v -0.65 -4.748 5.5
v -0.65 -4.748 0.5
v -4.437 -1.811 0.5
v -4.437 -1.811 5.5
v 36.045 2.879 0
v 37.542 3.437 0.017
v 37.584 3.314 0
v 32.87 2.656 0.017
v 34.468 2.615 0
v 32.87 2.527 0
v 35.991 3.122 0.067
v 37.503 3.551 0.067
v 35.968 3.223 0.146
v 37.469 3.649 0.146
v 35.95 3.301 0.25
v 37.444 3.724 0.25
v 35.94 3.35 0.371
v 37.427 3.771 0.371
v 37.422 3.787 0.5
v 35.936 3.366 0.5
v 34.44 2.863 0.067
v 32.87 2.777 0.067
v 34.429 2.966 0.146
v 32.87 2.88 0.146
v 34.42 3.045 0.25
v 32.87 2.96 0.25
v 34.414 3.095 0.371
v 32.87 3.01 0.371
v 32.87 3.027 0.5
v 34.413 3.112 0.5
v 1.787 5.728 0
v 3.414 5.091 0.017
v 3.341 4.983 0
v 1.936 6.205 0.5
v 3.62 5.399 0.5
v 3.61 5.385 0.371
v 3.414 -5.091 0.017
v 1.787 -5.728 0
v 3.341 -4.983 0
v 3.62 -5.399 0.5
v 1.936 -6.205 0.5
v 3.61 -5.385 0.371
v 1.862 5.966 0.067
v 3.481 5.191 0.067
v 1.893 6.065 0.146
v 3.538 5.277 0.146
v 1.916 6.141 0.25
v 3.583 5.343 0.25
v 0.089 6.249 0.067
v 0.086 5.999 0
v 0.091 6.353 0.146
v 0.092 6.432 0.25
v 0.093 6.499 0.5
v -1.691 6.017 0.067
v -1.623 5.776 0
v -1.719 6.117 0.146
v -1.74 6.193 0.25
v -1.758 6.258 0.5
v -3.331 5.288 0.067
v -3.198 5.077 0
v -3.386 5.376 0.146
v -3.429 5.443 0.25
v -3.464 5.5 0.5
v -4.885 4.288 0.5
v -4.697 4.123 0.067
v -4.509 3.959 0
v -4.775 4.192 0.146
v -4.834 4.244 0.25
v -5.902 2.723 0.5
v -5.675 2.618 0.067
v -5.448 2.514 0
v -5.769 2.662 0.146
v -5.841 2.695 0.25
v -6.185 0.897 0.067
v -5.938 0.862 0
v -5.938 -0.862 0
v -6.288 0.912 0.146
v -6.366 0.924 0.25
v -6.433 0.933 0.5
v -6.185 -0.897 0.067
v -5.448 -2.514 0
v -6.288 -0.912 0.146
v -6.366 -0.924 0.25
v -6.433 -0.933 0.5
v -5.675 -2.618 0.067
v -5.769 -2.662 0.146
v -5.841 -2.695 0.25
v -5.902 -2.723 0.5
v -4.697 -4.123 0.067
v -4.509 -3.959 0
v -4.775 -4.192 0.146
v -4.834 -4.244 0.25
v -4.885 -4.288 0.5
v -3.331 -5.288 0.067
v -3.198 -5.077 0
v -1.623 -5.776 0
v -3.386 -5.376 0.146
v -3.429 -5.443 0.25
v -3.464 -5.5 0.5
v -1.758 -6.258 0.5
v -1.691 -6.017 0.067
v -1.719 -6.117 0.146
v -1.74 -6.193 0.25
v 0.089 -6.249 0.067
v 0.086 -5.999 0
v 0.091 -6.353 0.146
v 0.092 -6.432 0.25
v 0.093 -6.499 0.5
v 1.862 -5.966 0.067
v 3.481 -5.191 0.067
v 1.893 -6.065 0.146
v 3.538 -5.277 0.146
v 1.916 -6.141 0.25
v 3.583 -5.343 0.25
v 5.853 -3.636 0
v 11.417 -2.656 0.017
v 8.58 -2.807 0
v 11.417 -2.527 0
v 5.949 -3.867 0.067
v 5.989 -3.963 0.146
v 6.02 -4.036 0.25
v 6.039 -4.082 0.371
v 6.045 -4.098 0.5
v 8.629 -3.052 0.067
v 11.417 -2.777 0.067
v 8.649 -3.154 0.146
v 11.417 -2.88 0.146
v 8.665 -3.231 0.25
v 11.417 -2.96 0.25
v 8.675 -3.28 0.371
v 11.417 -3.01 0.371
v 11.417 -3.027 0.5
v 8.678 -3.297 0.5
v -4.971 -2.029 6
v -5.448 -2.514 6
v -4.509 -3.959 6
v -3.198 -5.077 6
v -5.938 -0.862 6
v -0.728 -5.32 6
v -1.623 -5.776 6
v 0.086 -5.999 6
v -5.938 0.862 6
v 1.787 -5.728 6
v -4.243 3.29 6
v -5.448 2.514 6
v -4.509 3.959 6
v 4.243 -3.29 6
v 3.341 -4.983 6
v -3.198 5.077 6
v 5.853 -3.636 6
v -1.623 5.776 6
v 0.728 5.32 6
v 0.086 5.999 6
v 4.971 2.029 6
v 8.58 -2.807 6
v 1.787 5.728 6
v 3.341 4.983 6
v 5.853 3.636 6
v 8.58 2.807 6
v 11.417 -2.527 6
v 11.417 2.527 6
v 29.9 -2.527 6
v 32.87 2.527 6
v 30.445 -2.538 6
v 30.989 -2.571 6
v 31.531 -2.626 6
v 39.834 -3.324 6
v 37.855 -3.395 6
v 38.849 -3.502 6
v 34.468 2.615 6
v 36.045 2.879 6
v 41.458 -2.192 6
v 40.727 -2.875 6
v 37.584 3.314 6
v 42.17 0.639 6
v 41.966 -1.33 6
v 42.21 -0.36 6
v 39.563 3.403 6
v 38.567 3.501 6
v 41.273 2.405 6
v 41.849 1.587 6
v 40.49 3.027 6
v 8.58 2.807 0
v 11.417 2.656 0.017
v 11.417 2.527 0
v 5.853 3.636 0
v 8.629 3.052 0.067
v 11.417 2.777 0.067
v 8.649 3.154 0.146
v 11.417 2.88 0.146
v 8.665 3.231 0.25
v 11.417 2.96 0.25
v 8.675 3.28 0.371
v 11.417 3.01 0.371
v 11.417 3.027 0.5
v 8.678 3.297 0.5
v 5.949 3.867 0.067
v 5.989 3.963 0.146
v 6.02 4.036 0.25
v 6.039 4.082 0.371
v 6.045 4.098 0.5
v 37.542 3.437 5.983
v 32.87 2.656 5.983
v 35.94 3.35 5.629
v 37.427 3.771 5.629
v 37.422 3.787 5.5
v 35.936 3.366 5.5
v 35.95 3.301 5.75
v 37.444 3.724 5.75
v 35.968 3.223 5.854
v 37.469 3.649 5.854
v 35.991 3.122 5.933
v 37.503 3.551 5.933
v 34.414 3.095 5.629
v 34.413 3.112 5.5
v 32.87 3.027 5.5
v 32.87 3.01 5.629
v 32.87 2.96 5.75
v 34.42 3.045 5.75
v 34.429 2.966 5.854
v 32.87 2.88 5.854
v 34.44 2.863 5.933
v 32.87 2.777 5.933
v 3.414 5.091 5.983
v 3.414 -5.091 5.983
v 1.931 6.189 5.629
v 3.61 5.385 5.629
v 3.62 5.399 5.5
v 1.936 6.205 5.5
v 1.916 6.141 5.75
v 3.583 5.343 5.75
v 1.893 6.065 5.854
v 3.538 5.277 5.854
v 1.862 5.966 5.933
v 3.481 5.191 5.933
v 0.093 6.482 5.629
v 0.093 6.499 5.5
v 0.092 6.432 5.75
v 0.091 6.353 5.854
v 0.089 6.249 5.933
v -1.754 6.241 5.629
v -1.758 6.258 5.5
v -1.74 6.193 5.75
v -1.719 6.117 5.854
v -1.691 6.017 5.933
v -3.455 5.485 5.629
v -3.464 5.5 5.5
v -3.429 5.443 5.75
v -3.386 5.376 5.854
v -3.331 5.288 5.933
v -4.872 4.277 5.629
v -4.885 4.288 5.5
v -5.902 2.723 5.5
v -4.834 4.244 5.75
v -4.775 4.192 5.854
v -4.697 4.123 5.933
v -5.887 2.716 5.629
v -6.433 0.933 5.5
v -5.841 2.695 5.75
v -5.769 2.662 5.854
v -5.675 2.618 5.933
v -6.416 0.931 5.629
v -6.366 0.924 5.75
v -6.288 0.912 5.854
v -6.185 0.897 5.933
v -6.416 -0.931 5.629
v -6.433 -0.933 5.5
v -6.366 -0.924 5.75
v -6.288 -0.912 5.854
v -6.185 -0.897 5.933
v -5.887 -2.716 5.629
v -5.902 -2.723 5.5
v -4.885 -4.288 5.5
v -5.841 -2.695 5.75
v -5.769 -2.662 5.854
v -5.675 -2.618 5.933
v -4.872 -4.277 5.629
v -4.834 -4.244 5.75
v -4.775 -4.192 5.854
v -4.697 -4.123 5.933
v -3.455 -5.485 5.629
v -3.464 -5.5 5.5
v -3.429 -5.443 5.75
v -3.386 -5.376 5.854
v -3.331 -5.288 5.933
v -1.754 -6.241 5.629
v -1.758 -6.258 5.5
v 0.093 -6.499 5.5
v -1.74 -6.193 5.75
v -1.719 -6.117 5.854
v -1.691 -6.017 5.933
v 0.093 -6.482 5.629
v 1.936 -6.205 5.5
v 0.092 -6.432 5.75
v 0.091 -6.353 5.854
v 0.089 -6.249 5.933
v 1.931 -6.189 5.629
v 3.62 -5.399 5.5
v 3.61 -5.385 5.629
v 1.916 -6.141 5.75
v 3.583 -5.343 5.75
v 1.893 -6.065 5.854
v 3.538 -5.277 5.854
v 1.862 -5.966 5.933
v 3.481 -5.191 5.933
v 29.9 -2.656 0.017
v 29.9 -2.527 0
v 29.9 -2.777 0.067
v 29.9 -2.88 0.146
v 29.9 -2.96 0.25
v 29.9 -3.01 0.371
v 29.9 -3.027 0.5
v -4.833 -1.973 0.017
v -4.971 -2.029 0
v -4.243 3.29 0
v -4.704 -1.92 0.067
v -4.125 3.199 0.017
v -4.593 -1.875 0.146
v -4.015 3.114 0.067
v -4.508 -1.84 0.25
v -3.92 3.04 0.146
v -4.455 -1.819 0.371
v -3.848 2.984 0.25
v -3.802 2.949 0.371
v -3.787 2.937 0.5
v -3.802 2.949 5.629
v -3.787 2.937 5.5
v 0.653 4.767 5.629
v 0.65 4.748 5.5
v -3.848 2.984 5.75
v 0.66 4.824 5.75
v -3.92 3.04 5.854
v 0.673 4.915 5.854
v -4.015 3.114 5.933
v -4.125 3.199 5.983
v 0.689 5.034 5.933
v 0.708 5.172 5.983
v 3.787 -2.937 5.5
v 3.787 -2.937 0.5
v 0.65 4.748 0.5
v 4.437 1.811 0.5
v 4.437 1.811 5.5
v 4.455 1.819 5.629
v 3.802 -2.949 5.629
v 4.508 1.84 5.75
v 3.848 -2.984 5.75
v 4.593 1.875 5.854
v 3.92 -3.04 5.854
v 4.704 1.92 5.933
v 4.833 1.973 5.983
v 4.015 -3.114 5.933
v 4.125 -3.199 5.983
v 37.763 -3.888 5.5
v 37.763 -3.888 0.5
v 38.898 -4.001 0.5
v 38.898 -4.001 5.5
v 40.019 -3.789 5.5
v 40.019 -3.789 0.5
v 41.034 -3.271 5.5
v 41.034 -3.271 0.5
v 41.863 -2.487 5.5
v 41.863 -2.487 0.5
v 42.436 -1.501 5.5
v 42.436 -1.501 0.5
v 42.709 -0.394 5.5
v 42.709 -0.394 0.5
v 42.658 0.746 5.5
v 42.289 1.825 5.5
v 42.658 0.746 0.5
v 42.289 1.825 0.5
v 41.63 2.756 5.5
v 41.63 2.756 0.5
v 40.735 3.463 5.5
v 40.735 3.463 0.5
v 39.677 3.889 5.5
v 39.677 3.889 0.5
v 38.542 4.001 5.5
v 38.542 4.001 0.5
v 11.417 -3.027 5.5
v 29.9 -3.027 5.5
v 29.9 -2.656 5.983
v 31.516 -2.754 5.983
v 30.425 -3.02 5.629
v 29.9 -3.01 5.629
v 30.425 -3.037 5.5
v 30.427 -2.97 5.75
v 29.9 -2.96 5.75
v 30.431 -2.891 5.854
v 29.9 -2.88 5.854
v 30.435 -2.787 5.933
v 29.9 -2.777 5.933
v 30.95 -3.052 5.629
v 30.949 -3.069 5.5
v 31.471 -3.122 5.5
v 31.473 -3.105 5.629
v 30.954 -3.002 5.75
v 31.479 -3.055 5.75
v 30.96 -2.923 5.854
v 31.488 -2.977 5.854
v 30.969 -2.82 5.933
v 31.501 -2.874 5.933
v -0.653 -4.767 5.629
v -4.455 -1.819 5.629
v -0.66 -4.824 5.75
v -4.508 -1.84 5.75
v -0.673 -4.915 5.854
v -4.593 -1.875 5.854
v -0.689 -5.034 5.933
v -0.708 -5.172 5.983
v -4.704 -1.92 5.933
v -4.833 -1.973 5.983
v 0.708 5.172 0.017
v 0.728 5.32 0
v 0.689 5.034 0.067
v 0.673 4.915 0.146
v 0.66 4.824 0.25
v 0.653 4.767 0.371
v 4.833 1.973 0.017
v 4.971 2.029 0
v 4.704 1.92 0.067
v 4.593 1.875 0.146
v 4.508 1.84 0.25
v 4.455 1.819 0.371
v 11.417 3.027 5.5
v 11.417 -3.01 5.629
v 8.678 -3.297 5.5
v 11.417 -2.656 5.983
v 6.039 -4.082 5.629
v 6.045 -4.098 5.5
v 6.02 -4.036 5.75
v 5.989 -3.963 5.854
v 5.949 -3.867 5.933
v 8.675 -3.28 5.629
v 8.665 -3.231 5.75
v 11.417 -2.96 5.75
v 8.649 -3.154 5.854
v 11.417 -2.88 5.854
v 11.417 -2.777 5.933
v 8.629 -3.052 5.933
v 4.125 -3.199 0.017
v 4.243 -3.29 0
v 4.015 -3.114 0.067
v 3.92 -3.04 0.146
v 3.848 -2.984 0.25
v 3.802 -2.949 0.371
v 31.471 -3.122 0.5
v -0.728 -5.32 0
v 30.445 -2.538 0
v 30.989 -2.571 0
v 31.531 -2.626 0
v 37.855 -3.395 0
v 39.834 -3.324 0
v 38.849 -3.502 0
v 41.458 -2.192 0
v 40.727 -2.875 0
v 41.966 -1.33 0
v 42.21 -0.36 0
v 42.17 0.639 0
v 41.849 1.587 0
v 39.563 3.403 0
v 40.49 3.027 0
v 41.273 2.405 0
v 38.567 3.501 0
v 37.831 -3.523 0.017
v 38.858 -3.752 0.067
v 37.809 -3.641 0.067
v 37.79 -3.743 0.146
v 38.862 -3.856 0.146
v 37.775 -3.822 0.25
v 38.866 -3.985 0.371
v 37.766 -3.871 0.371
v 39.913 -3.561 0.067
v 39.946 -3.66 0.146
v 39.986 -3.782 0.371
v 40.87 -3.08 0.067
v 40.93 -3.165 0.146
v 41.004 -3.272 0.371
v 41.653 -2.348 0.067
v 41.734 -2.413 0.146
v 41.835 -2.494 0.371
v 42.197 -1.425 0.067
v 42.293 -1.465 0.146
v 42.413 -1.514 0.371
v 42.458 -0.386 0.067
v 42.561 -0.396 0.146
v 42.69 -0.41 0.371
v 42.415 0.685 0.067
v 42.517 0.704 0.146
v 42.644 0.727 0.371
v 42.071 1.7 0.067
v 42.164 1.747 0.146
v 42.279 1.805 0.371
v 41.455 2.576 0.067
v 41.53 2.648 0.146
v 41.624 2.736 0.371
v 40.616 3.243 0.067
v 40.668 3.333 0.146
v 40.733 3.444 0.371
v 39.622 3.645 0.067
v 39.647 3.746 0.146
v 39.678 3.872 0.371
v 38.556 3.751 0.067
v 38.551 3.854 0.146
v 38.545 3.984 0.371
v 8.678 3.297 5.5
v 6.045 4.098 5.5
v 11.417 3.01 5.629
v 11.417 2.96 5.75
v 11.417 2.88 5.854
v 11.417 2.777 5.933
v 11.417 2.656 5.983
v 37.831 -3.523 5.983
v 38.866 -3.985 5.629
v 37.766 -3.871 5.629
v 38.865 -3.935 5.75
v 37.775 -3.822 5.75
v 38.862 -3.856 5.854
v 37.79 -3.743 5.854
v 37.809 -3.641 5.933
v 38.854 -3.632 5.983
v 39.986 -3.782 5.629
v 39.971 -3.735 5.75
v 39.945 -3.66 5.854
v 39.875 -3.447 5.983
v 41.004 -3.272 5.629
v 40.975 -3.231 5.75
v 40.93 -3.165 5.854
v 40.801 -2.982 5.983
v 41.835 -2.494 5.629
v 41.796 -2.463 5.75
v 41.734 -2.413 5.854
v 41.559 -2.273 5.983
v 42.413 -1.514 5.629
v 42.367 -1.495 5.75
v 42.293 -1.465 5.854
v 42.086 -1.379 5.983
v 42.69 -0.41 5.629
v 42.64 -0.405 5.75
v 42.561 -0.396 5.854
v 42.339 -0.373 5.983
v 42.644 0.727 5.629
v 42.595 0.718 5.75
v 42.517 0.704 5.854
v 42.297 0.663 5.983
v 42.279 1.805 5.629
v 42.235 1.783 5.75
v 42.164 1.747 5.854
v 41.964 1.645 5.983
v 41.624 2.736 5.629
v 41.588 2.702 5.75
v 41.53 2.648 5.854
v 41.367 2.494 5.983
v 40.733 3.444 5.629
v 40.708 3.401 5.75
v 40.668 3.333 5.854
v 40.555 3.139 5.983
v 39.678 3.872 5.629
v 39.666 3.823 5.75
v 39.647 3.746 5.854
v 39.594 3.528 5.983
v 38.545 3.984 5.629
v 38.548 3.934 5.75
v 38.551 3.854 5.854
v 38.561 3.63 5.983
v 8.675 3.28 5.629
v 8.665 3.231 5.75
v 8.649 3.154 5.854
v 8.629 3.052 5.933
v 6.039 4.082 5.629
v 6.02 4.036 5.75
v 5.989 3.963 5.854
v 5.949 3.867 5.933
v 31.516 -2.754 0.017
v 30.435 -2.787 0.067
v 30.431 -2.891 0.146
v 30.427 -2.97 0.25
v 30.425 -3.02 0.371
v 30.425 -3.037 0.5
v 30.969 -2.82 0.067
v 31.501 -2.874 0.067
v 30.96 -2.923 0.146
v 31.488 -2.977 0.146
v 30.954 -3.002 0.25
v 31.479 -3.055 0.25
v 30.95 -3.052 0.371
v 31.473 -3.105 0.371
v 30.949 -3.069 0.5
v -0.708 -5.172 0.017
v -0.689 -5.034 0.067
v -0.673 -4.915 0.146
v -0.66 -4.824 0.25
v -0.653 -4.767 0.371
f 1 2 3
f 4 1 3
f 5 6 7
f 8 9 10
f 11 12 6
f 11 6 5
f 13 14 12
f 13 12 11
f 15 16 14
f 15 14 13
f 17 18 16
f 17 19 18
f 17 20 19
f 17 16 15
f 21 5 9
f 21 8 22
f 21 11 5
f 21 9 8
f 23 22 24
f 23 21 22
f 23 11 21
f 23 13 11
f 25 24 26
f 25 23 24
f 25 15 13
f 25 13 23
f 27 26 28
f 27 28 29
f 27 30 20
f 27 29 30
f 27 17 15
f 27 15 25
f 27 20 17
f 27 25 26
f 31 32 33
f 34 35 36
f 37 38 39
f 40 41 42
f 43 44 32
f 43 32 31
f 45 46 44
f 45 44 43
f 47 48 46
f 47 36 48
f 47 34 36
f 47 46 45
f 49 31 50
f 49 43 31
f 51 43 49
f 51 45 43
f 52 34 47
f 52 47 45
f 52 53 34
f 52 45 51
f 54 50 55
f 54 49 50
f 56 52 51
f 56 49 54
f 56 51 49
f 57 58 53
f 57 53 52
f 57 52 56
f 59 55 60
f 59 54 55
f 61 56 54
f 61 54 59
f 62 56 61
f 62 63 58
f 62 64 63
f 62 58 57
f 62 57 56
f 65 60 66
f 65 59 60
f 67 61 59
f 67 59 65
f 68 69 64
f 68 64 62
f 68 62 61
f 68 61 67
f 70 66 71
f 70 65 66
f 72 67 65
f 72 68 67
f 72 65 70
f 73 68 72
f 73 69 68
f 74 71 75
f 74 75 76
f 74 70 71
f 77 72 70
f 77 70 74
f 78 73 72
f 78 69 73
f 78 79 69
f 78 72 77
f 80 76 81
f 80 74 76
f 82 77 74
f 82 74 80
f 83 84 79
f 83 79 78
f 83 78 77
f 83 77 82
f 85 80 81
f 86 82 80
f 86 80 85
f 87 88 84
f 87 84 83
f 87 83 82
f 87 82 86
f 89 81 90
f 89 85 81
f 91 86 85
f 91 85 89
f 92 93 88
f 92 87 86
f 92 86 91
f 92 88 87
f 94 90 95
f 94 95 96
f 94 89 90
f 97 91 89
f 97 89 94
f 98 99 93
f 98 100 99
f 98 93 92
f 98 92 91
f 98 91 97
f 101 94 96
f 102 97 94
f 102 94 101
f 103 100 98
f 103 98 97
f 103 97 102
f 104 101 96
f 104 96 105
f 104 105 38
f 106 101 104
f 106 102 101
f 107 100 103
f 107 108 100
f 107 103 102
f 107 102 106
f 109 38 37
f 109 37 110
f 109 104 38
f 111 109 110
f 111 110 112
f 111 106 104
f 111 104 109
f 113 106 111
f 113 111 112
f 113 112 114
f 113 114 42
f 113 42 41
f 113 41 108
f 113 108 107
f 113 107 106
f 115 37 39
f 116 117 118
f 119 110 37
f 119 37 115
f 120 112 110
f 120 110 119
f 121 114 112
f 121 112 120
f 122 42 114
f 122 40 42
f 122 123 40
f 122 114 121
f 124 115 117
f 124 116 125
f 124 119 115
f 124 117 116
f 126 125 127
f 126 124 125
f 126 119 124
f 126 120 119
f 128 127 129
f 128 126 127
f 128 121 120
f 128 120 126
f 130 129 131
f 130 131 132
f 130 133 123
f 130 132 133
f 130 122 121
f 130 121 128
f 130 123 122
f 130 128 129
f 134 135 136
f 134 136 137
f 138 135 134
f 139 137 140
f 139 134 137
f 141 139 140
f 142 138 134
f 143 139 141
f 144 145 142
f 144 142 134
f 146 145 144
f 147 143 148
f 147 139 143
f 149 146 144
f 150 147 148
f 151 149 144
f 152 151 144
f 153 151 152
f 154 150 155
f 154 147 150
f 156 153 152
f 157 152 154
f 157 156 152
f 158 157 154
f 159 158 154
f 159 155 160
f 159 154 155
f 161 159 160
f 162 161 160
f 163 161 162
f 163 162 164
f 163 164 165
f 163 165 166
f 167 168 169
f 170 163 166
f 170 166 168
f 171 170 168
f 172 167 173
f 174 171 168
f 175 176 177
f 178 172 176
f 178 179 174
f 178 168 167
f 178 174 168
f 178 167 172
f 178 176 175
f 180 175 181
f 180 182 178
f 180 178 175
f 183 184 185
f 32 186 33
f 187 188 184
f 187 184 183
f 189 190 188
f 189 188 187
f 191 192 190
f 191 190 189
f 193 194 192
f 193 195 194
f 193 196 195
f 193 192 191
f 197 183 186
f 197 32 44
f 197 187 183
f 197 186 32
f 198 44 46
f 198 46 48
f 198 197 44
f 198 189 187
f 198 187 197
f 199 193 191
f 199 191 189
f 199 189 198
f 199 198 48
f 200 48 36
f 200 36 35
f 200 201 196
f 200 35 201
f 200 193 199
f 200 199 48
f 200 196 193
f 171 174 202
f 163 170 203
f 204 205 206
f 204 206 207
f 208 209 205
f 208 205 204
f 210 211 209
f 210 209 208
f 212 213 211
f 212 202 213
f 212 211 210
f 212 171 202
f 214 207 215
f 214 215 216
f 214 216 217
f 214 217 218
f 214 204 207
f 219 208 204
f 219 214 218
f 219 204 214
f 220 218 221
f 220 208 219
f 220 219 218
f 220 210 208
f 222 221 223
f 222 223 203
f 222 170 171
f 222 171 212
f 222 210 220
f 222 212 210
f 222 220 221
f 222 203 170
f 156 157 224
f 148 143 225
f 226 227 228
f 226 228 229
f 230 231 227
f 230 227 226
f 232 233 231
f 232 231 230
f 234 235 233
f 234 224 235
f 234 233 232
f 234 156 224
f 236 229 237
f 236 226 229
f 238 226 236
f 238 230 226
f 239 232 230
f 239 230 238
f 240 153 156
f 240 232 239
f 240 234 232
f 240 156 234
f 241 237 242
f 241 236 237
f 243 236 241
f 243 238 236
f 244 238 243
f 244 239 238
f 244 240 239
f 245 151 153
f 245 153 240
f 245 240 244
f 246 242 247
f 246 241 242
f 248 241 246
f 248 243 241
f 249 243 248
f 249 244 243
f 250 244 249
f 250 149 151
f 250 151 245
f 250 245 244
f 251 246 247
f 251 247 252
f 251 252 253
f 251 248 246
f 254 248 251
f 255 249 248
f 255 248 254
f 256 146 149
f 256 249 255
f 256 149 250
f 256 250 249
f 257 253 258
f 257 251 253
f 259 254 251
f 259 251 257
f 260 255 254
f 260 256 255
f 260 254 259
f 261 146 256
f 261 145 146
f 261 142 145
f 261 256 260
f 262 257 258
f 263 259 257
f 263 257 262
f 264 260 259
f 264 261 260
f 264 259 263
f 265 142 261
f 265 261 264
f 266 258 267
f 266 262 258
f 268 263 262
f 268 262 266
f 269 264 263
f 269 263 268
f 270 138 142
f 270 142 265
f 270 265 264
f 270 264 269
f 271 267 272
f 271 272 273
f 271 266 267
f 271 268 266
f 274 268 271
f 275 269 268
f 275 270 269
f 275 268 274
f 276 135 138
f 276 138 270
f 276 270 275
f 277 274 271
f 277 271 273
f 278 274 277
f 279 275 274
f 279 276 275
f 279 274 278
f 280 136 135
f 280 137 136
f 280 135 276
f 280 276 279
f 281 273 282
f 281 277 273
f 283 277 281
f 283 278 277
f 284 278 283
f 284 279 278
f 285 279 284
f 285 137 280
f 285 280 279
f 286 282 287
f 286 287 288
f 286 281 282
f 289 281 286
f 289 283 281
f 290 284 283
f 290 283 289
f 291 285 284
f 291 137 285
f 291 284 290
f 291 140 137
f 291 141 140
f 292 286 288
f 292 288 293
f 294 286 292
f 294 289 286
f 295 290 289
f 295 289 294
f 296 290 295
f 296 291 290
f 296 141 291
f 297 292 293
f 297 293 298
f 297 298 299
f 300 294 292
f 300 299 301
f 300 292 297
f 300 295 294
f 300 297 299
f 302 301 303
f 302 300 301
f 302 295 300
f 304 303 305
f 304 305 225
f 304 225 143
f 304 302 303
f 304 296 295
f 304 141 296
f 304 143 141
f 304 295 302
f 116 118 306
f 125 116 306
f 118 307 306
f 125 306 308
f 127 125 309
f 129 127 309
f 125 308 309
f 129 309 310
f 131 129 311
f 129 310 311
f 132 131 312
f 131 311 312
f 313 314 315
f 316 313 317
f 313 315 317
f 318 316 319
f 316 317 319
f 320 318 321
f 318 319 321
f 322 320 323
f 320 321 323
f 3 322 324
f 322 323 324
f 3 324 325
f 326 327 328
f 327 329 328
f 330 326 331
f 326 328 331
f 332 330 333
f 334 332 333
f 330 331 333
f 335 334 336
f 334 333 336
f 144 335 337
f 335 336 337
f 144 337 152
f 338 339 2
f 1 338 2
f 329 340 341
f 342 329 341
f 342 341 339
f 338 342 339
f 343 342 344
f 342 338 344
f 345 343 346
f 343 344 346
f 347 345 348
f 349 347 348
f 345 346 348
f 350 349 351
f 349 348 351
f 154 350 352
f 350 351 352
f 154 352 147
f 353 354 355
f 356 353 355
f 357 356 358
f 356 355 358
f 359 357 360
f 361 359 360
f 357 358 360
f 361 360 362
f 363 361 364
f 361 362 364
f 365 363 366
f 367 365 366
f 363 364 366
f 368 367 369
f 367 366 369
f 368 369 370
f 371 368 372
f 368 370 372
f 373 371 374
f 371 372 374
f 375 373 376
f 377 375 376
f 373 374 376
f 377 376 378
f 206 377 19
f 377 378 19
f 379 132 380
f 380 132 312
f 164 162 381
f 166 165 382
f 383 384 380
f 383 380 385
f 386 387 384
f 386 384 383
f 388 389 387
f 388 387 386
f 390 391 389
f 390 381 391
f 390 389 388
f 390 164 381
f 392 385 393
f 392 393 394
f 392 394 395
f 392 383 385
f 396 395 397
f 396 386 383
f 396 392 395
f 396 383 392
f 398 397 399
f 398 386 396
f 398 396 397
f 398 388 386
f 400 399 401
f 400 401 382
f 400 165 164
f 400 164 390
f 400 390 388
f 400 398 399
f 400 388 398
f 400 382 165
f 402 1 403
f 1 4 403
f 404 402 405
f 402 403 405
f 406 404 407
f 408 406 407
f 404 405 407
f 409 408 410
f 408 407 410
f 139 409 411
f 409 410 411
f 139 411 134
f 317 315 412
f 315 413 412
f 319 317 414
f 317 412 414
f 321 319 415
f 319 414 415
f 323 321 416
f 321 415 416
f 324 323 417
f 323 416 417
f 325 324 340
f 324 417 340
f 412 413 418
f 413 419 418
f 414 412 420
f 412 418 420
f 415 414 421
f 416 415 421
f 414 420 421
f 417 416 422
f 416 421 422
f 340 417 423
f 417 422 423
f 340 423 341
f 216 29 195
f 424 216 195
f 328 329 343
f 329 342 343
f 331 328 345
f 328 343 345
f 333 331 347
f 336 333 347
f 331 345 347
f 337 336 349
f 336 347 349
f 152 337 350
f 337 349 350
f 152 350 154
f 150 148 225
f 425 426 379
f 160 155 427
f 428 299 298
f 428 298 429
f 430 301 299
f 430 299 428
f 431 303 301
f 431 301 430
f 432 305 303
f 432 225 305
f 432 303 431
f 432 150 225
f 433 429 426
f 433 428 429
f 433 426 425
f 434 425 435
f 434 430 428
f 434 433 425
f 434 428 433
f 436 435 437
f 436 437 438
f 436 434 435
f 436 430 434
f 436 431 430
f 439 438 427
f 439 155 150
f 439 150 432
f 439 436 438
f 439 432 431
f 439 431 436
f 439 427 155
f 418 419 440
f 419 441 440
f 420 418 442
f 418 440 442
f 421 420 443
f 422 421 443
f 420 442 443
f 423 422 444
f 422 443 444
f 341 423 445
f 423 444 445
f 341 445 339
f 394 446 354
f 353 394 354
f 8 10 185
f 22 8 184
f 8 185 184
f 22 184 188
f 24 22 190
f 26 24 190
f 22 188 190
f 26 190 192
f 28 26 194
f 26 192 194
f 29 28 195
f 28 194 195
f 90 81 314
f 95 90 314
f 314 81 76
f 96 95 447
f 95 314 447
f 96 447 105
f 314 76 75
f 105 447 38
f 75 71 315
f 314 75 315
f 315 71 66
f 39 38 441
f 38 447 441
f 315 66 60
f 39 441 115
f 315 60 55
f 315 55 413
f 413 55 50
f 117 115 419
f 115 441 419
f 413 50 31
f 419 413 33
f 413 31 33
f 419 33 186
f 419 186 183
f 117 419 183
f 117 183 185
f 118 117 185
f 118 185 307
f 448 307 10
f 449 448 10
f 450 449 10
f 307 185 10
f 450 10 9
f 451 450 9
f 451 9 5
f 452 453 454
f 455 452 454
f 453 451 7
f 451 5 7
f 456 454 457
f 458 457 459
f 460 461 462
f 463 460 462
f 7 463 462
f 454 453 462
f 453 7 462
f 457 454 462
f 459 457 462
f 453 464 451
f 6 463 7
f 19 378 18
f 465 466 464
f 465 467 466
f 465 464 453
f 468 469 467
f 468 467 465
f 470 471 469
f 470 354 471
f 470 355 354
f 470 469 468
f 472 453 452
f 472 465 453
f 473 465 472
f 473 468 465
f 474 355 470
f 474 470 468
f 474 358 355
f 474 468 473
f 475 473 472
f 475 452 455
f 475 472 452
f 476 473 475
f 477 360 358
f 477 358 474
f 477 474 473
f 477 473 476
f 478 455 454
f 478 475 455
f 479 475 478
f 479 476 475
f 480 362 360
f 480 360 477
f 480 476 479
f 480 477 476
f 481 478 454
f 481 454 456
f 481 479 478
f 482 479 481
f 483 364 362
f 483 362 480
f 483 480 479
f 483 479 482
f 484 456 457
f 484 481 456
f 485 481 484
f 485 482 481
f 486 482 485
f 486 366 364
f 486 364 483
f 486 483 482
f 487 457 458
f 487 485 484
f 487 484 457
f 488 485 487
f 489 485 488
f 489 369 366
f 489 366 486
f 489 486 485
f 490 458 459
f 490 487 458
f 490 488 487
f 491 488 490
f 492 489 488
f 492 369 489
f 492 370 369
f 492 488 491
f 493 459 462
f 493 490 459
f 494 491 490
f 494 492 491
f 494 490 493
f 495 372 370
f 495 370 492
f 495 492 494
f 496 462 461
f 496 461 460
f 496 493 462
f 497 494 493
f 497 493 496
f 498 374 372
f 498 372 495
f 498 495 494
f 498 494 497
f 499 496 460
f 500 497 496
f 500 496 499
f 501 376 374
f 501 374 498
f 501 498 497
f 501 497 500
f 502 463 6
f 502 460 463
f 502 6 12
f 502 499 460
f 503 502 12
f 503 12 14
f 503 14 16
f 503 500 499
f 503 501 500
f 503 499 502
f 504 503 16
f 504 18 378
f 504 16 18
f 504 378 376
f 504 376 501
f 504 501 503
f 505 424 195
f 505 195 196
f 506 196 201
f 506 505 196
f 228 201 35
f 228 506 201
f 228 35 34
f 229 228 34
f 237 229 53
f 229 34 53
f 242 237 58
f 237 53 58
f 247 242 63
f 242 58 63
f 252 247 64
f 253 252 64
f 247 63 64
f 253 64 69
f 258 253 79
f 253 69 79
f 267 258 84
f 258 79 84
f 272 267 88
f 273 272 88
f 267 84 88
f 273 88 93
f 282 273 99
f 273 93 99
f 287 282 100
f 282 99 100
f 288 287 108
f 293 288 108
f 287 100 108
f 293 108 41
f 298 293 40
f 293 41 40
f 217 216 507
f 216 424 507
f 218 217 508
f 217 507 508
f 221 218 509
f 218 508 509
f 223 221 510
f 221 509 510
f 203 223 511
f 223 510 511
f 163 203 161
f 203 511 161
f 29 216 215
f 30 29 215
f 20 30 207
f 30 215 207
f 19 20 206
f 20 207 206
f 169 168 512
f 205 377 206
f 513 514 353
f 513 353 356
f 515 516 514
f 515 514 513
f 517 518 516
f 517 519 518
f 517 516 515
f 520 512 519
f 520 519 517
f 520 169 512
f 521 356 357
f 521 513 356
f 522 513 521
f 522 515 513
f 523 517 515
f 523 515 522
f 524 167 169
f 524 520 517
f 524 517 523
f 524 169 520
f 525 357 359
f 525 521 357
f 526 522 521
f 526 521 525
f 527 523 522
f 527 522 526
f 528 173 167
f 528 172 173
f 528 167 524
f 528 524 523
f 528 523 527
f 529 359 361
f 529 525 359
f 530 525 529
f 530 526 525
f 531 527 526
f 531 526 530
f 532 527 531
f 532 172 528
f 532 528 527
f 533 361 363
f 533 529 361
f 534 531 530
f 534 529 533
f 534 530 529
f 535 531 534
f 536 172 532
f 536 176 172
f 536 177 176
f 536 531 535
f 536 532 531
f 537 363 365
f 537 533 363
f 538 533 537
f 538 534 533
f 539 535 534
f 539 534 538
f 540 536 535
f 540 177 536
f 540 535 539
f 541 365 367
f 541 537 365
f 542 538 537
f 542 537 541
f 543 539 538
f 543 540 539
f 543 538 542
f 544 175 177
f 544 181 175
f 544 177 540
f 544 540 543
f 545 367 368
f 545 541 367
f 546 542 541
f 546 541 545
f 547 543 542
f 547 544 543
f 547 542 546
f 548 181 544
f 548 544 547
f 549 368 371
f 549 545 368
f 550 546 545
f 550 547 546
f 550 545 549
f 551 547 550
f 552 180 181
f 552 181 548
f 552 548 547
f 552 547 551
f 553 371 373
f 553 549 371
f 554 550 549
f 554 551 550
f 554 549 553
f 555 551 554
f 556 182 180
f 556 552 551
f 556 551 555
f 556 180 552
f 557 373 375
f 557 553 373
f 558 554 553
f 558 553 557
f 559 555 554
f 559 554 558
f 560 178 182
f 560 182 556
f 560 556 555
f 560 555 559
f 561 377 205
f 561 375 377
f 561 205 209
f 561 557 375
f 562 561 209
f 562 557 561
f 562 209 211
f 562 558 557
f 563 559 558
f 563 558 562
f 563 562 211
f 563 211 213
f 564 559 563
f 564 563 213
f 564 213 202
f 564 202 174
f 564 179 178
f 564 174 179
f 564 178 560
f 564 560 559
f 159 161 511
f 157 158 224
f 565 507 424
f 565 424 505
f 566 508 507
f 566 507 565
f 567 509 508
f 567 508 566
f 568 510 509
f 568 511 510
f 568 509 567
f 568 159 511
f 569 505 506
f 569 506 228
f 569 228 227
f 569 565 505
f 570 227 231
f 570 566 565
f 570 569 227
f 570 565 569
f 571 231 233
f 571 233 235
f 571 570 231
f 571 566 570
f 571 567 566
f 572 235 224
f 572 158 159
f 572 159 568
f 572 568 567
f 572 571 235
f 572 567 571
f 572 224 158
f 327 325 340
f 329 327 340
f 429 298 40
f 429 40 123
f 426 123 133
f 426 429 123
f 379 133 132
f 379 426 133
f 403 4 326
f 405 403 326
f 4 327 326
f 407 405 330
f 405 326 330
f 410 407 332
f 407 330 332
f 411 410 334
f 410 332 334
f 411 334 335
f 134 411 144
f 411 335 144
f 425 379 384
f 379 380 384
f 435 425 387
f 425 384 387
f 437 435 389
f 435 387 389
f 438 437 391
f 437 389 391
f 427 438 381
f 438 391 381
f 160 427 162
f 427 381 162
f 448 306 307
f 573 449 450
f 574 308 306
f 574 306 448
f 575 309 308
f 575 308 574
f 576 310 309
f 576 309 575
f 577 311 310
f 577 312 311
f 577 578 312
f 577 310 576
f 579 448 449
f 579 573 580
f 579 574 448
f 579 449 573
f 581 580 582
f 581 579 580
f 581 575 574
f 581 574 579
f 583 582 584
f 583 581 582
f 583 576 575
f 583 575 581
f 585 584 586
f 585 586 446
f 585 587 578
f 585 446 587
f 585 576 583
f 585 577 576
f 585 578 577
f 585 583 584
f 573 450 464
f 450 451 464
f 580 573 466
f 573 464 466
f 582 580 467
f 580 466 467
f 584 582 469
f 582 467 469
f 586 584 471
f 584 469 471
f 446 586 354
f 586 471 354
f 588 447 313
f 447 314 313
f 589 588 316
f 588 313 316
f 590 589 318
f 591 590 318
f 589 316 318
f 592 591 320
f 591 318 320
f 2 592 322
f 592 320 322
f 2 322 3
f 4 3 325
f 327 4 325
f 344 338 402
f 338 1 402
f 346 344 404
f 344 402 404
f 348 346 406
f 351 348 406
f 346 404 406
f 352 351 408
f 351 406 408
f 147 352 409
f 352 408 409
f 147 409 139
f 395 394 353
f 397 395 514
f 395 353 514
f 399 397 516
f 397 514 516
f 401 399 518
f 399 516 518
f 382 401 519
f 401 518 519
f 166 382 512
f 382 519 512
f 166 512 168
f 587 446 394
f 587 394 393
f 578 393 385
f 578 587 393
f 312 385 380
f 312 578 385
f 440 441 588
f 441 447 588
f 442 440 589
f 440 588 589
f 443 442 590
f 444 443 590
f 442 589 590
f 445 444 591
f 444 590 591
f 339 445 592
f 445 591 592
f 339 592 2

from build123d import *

# Parameters (mm, degrees)
F1_DEPTH    = 6
F2_R        = 14
F3_T1_DEPTH = 6
F4_R        = 13
F5_R        = 0.5


# Not quite as in the source:
# - a fillet or chamfer that OpenCascade refuses, or shapes differently, is made with other operations: its cross-section is extruded or revolved along the edge and cut away or added


with BuildPart() as f1:
    # F0 (on Top) → F1 (new body)
    with BuildSketch(Plane.XY):
        with BuildLine():
            Line((36.1013870801, 3.026675175), (5.7523245202, 3.026675175))
            ThreePointArc((5.7523245202, 3.026675175), (-6.5, 0), (5.7523245202, -3.026675175))
            Line((5.7523245202, -3.026675175), (36.1013870801, -3.026675175))
            ThreePointArc((36.1013870801, -3.026675175), (42.7283578295, 0), (36.1013870801, 3.026675175))
        make_face()
        Polygon((-3.7867383436, 2.9366555893), (0.6498491707, 4.7477393977), (4.4365875143, 1.8110838084), (3.7867383436, -2.9366555893), (-0.6498491707, -4.7477393977), (-4.4365875143, -1.8110838084), align=None, mode=Mode.SUBTRACT)
    extrude(amount=F1_DEPTH)

    # F2
    f2_edges = [f1.edges().sort_by_distance(p)[0] for p in [
        (5.752325, -3.026675, 3),
        (5.752325, 3.026675, 3),
        (36.101387, 3.026675, 3),
    ]]
    fillet(f2_edges, radius=F2_R)

    # F3: chamfer of 11 on 1 edges, made by hand

    # F3_s2 → F3_t1 (join)
    with BuildSketch(Plane.XY):
        with BuildLine():
            Line((30.2515384912, -2.9735152662), (38.1998957411, -3.9409061384))
            Line((38.1998957411, -3.9409061384), (38.2526662364, -3.7273288109))
            ThreePointArc((38.2526662364, -3.7273288109), (37.1662038799, -3.4493250658), (36.2454465167, -2.8604016692))
            Line((36.2454465167, -2.8604016692), (36.1013870801, -2.806675175))
            ThreePointArc((36.1013870801, -2.806675175), (33.1764627857, -2.806675175), (30.2515384912, -2.7535152662))
            Line((30.2515384912, -2.7535152662), (30.2515384912, -2.9735152662))
        make_face()
    extrude(amount=F3_T1_DEPTH)

    # F4
    f4_edges = [f1.edges().sort_by_distance(p)[0] for p in [
        (30.688315, -3.026675, 3),
    ]]
    fillet(f4_edges, radius=F4_R)

    # F5
    f5_edges = [f1.edges().sort_by_distance(p)[0] for p in [
        (20.658434, -3.026675, 0),
        (30.686871, -3.050504, 0),
        (7.341933, -3.632803, 0),
        (34.616932, -3.504825, 0),
        (-6.5, 0, 0),
        (42.724404, 0.177915, 0),
        (7.341933, 3.632803, 0),
        (35.177697, 3.218098, 0),
        (22.143624, 3.026675, 0),
        (-4.111663, 0.562786, 0),
        (-1.568445, 3.842197, 0),
        (2.543218, 3.279412, 0),
        (4.111663, -0.562786, 0),
        (1.568445, -3.842197, 0),
        (-2.543218, -3.279412, 0),
        (20.658434, -3.026675, 6),
        (30.686871, -3.050504, 6),
        (7.341933, -3.632803, 6),
        (34.616932, -3.504825, 6),
        (-6.5, 0, 6),
        (42.724404, 0.177915, 6),
        (7.341933, 3.632803, 6),
        (35.177697, 3.218098, 6),
        (22.143624, 3.026675, 6),
        (-4.111663, 0.562786, 6),
        (-1.568445, 3.842197, 6),
        (2.543218, 3.279412, 6),
        (4.111663, -0.562786, 6),
        (1.568445, -3.842197, 6),
        (-2.543218, -3.279412, 6),
    ]]
    fillet(f5_edges, radius=F5_R)


solid = f1.part
